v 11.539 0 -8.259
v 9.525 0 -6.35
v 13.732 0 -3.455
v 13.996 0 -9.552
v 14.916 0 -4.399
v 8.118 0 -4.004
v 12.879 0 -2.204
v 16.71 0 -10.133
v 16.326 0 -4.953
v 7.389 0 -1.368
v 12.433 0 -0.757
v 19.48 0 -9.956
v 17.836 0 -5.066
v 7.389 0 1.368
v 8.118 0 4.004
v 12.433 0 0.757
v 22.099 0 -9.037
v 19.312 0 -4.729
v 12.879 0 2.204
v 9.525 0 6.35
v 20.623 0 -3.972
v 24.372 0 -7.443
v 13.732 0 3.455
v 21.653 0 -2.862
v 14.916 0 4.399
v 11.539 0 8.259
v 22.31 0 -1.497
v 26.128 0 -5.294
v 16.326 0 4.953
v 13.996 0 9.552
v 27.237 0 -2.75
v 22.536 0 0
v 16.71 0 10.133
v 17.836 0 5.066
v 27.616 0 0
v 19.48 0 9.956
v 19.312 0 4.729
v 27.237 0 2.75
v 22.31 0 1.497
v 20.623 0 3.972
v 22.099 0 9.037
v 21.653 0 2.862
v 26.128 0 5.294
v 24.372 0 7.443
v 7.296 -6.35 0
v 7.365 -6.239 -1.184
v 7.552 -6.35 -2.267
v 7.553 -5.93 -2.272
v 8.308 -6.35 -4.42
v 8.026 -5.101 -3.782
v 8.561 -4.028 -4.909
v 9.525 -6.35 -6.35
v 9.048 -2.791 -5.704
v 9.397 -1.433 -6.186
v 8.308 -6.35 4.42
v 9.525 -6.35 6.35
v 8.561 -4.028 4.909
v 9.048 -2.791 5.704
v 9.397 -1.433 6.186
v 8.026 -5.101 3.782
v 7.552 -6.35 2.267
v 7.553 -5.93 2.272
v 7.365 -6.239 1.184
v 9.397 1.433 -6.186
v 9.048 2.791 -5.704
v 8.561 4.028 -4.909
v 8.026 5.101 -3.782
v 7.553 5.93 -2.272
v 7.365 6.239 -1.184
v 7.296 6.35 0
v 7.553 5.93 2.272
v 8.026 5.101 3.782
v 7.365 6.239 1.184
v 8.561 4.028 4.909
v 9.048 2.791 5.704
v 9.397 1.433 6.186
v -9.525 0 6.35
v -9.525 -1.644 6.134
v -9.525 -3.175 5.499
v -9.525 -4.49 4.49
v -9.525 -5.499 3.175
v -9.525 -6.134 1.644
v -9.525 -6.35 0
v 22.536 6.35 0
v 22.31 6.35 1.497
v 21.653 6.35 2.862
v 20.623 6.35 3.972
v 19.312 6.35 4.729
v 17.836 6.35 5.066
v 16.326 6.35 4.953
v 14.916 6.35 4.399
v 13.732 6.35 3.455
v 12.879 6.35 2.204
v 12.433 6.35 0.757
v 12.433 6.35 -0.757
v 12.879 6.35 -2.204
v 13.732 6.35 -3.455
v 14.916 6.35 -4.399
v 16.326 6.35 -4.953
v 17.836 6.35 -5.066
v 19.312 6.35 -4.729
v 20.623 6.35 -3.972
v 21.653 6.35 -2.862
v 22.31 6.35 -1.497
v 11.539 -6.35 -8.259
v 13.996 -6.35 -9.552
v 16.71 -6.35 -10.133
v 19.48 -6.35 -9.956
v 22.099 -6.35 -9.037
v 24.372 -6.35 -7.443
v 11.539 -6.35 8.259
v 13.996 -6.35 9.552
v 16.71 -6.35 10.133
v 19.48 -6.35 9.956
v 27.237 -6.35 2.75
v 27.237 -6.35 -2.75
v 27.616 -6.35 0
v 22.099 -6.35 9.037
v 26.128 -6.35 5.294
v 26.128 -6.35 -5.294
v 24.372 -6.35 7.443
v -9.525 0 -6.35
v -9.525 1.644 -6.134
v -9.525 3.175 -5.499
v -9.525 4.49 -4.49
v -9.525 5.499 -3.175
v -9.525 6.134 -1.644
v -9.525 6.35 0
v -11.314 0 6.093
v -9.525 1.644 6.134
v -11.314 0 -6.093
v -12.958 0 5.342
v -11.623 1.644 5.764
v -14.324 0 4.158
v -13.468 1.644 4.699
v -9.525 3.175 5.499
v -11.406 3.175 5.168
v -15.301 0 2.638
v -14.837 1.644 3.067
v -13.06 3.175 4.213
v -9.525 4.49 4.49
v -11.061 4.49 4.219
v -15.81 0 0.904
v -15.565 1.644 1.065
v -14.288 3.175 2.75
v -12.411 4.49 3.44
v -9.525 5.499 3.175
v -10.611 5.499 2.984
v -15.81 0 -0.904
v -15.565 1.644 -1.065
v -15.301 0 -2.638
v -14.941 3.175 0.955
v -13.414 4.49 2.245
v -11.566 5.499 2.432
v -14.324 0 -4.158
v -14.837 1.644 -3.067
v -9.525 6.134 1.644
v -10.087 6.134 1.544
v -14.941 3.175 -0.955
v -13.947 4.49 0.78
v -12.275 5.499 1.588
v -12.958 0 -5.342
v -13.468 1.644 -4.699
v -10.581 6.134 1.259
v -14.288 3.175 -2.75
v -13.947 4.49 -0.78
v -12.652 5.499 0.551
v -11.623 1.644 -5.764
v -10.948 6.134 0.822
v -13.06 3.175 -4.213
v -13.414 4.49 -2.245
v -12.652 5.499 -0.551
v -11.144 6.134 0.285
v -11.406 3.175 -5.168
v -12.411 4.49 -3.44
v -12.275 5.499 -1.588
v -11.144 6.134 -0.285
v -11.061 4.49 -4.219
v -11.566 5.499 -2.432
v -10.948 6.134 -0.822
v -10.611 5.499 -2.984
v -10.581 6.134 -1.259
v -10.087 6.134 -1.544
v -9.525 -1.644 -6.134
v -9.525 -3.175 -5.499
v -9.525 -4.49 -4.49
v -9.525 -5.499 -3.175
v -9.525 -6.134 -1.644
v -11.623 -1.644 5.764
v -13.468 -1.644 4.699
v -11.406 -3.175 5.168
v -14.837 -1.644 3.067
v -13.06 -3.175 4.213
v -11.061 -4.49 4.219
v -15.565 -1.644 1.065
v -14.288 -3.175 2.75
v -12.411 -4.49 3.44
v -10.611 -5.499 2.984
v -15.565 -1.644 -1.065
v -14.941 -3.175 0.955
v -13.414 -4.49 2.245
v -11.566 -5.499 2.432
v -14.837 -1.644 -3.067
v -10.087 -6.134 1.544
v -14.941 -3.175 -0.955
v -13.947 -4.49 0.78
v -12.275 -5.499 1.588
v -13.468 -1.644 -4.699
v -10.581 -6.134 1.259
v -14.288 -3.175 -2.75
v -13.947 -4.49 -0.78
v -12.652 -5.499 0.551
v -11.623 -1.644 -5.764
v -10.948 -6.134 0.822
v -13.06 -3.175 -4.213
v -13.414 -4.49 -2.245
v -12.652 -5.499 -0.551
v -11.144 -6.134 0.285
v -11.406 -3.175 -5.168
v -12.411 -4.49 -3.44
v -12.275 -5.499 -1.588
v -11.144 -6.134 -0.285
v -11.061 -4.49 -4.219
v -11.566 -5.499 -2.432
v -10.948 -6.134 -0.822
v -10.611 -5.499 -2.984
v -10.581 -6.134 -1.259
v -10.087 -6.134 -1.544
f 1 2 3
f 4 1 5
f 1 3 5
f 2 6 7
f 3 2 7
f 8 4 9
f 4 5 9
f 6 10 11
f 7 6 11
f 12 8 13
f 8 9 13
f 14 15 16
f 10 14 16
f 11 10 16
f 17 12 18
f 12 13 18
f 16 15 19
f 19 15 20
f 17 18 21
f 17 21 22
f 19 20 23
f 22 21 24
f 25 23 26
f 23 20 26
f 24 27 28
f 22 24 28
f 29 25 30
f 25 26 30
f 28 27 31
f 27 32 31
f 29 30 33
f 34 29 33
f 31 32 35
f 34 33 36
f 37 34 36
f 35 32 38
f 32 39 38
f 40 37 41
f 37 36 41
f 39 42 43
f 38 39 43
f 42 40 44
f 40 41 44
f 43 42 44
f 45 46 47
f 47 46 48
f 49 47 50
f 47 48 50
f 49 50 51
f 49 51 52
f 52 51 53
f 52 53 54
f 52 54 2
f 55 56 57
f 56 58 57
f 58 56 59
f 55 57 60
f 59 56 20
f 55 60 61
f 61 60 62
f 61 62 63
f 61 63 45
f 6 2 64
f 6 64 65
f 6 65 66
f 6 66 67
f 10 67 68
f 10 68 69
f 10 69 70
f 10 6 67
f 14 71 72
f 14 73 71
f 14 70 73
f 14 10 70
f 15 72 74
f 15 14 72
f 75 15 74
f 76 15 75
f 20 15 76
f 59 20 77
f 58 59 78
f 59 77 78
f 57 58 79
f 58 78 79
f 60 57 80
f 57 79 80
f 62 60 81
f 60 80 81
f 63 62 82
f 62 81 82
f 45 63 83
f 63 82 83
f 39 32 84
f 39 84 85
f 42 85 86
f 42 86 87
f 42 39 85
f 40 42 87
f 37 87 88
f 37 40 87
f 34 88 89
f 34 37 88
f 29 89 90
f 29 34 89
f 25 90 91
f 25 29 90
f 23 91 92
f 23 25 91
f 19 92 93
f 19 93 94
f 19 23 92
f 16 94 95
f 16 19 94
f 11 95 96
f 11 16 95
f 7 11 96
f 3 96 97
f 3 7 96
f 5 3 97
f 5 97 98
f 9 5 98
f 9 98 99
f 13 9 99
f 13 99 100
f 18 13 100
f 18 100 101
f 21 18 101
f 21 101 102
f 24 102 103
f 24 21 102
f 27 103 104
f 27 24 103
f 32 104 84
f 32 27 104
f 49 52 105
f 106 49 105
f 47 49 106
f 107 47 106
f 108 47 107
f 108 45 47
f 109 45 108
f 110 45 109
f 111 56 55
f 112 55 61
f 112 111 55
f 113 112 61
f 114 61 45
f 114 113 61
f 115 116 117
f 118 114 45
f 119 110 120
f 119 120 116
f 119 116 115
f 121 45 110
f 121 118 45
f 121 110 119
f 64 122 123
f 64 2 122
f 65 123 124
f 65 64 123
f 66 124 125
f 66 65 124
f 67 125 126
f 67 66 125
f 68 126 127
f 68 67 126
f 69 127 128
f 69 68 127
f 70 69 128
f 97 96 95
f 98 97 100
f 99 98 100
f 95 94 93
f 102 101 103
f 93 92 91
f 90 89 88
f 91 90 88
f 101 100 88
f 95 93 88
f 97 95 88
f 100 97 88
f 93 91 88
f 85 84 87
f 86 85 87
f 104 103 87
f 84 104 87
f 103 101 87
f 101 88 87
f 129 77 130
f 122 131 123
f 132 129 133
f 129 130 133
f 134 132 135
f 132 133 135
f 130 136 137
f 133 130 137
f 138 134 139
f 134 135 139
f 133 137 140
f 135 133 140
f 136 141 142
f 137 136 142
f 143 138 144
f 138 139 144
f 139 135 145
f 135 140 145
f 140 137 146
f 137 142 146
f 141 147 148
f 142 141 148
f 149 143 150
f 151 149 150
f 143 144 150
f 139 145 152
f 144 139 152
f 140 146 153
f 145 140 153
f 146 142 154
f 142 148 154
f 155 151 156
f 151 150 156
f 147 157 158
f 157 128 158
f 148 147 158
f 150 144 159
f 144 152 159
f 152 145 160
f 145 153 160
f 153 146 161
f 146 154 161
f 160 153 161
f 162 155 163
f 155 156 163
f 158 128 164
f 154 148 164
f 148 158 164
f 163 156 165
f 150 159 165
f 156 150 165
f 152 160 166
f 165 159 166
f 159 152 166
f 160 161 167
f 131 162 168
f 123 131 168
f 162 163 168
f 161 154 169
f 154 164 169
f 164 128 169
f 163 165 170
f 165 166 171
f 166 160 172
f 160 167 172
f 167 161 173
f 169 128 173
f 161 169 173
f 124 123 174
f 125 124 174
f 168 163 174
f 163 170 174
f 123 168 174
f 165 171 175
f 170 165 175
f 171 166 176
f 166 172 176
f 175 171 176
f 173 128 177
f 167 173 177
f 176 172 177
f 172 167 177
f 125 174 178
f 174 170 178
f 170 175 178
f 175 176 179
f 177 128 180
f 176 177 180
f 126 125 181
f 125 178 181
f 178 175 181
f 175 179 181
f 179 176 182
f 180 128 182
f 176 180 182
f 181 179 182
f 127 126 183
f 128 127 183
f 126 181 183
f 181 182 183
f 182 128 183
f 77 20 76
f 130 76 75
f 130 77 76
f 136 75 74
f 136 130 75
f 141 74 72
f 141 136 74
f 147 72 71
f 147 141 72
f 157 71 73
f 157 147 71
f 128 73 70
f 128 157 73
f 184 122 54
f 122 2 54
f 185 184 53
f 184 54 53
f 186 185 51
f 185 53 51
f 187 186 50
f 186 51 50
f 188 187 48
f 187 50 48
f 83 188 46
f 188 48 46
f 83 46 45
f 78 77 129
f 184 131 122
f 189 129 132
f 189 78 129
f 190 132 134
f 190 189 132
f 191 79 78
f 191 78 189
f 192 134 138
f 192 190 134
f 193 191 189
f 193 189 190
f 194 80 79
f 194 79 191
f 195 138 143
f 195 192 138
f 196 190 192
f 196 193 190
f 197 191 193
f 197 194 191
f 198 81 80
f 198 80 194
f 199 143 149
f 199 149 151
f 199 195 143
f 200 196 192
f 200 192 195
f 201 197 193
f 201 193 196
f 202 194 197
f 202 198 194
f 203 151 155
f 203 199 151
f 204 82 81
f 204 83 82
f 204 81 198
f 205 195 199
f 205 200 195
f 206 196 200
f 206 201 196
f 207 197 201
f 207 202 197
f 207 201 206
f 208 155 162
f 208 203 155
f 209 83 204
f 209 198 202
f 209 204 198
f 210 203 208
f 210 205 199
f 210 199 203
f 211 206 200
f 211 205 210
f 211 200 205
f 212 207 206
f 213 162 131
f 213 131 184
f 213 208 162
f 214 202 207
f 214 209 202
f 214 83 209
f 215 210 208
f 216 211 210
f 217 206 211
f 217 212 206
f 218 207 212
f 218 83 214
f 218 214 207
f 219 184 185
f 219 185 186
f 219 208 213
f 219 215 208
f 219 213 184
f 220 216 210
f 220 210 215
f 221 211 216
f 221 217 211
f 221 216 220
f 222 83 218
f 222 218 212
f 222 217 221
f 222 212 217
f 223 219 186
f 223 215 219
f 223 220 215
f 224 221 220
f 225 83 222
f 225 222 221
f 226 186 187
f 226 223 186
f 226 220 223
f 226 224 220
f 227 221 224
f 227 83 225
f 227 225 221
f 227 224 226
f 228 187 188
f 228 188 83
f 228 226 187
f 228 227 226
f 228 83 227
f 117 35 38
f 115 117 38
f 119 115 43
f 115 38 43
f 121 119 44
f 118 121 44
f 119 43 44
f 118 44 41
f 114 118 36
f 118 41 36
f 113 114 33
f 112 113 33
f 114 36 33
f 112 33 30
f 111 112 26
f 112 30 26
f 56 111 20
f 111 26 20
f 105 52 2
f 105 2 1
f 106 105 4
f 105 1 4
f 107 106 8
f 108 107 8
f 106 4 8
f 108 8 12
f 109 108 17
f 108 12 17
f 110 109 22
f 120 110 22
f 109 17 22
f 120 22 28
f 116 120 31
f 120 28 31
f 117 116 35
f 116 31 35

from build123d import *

# Parameters (mm, degrees)
F1_DEPTH = 6.35
F2_R     = 6.3499
F0_R     = 5.08
F3_DEPTH = 6.35
F4_DEPTH = 6.35


# Not quite as in the source:
# - a fillet or chamfer is up to 0.001 mm smaller than in the source, because OpenCascade refuses the exact size


with BuildPart() as f1:
    # F0 (on Front) → F1 (new body, symmetric)
    with BuildSketch(Plane.XZ):
        with BuildLine():
            Line((9.525, 6.35), (-9.525, 6.35))
            Line((-9.525, 6.35), (-9.525, -6.35))
            Line((-9.525, -6.35), (9.525, -6.35))
            ThreePointArc((9.525, -6.35), (7.296147458, 0), (9.525, 6.35))
        make_face()
        with BuildLine():
            Line((-9.525, -6.35), (-9.525, 6.35))
            ThreePointArc((-9.525, 6.35), (-15.875, 0), (-9.525, -6.35))
        make_face()
    extrude(amount=F1_DEPTH, both=True)

    # F2 (radius 6.35 in the source; OpenCascade refuses exactly that, so slightly less here)
    f2_edges = [f1.edges().sort_by_distance(p)[0] for p in [
        (0, -6.35, 6.35),
        (0, 6.35, 6.35),
        (0, -6.35, -6.35),
        (0, 6.35, -6.35),
    ]]
    fillet(f2_edges, radius=F2_R)

    # F0 (on Front) → F3 (join)
    with BuildSketch(Plane.XZ):
        with BuildLine():
            ThreePointArc((27.616147458, 0), (20.8210502669, 9.5866067556), (9.525, 6.35))
            Line((9.525, 6.35), (9.525, -6.35))
            ThreePointArc((9.525, -6.35), (20.8210502669, -9.5866067556), (27.616147458, 0))
        make_face()
        with Locations((17.456147458, 0)):
            Circle(F0_R, mode=Mode.SUBTRACT)
        with BuildLine():
            Line((9.525, -6.35), (9.525, 6.35))
            ThreePointArc((9.525, 6.35), (7.296147458, 0), (9.525, -6.35))
        make_face()
    extrude(amount=F3_DEPTH)

    # F0 (on Front) → F4 (join, symmetric)
    with BuildSketch(Plane.XZ):
        with Locations((17.456147458, 0)):
            Circle(F0_R)
    extrude(amount=F4_DEPTH, both=True)


solid = f1.part
